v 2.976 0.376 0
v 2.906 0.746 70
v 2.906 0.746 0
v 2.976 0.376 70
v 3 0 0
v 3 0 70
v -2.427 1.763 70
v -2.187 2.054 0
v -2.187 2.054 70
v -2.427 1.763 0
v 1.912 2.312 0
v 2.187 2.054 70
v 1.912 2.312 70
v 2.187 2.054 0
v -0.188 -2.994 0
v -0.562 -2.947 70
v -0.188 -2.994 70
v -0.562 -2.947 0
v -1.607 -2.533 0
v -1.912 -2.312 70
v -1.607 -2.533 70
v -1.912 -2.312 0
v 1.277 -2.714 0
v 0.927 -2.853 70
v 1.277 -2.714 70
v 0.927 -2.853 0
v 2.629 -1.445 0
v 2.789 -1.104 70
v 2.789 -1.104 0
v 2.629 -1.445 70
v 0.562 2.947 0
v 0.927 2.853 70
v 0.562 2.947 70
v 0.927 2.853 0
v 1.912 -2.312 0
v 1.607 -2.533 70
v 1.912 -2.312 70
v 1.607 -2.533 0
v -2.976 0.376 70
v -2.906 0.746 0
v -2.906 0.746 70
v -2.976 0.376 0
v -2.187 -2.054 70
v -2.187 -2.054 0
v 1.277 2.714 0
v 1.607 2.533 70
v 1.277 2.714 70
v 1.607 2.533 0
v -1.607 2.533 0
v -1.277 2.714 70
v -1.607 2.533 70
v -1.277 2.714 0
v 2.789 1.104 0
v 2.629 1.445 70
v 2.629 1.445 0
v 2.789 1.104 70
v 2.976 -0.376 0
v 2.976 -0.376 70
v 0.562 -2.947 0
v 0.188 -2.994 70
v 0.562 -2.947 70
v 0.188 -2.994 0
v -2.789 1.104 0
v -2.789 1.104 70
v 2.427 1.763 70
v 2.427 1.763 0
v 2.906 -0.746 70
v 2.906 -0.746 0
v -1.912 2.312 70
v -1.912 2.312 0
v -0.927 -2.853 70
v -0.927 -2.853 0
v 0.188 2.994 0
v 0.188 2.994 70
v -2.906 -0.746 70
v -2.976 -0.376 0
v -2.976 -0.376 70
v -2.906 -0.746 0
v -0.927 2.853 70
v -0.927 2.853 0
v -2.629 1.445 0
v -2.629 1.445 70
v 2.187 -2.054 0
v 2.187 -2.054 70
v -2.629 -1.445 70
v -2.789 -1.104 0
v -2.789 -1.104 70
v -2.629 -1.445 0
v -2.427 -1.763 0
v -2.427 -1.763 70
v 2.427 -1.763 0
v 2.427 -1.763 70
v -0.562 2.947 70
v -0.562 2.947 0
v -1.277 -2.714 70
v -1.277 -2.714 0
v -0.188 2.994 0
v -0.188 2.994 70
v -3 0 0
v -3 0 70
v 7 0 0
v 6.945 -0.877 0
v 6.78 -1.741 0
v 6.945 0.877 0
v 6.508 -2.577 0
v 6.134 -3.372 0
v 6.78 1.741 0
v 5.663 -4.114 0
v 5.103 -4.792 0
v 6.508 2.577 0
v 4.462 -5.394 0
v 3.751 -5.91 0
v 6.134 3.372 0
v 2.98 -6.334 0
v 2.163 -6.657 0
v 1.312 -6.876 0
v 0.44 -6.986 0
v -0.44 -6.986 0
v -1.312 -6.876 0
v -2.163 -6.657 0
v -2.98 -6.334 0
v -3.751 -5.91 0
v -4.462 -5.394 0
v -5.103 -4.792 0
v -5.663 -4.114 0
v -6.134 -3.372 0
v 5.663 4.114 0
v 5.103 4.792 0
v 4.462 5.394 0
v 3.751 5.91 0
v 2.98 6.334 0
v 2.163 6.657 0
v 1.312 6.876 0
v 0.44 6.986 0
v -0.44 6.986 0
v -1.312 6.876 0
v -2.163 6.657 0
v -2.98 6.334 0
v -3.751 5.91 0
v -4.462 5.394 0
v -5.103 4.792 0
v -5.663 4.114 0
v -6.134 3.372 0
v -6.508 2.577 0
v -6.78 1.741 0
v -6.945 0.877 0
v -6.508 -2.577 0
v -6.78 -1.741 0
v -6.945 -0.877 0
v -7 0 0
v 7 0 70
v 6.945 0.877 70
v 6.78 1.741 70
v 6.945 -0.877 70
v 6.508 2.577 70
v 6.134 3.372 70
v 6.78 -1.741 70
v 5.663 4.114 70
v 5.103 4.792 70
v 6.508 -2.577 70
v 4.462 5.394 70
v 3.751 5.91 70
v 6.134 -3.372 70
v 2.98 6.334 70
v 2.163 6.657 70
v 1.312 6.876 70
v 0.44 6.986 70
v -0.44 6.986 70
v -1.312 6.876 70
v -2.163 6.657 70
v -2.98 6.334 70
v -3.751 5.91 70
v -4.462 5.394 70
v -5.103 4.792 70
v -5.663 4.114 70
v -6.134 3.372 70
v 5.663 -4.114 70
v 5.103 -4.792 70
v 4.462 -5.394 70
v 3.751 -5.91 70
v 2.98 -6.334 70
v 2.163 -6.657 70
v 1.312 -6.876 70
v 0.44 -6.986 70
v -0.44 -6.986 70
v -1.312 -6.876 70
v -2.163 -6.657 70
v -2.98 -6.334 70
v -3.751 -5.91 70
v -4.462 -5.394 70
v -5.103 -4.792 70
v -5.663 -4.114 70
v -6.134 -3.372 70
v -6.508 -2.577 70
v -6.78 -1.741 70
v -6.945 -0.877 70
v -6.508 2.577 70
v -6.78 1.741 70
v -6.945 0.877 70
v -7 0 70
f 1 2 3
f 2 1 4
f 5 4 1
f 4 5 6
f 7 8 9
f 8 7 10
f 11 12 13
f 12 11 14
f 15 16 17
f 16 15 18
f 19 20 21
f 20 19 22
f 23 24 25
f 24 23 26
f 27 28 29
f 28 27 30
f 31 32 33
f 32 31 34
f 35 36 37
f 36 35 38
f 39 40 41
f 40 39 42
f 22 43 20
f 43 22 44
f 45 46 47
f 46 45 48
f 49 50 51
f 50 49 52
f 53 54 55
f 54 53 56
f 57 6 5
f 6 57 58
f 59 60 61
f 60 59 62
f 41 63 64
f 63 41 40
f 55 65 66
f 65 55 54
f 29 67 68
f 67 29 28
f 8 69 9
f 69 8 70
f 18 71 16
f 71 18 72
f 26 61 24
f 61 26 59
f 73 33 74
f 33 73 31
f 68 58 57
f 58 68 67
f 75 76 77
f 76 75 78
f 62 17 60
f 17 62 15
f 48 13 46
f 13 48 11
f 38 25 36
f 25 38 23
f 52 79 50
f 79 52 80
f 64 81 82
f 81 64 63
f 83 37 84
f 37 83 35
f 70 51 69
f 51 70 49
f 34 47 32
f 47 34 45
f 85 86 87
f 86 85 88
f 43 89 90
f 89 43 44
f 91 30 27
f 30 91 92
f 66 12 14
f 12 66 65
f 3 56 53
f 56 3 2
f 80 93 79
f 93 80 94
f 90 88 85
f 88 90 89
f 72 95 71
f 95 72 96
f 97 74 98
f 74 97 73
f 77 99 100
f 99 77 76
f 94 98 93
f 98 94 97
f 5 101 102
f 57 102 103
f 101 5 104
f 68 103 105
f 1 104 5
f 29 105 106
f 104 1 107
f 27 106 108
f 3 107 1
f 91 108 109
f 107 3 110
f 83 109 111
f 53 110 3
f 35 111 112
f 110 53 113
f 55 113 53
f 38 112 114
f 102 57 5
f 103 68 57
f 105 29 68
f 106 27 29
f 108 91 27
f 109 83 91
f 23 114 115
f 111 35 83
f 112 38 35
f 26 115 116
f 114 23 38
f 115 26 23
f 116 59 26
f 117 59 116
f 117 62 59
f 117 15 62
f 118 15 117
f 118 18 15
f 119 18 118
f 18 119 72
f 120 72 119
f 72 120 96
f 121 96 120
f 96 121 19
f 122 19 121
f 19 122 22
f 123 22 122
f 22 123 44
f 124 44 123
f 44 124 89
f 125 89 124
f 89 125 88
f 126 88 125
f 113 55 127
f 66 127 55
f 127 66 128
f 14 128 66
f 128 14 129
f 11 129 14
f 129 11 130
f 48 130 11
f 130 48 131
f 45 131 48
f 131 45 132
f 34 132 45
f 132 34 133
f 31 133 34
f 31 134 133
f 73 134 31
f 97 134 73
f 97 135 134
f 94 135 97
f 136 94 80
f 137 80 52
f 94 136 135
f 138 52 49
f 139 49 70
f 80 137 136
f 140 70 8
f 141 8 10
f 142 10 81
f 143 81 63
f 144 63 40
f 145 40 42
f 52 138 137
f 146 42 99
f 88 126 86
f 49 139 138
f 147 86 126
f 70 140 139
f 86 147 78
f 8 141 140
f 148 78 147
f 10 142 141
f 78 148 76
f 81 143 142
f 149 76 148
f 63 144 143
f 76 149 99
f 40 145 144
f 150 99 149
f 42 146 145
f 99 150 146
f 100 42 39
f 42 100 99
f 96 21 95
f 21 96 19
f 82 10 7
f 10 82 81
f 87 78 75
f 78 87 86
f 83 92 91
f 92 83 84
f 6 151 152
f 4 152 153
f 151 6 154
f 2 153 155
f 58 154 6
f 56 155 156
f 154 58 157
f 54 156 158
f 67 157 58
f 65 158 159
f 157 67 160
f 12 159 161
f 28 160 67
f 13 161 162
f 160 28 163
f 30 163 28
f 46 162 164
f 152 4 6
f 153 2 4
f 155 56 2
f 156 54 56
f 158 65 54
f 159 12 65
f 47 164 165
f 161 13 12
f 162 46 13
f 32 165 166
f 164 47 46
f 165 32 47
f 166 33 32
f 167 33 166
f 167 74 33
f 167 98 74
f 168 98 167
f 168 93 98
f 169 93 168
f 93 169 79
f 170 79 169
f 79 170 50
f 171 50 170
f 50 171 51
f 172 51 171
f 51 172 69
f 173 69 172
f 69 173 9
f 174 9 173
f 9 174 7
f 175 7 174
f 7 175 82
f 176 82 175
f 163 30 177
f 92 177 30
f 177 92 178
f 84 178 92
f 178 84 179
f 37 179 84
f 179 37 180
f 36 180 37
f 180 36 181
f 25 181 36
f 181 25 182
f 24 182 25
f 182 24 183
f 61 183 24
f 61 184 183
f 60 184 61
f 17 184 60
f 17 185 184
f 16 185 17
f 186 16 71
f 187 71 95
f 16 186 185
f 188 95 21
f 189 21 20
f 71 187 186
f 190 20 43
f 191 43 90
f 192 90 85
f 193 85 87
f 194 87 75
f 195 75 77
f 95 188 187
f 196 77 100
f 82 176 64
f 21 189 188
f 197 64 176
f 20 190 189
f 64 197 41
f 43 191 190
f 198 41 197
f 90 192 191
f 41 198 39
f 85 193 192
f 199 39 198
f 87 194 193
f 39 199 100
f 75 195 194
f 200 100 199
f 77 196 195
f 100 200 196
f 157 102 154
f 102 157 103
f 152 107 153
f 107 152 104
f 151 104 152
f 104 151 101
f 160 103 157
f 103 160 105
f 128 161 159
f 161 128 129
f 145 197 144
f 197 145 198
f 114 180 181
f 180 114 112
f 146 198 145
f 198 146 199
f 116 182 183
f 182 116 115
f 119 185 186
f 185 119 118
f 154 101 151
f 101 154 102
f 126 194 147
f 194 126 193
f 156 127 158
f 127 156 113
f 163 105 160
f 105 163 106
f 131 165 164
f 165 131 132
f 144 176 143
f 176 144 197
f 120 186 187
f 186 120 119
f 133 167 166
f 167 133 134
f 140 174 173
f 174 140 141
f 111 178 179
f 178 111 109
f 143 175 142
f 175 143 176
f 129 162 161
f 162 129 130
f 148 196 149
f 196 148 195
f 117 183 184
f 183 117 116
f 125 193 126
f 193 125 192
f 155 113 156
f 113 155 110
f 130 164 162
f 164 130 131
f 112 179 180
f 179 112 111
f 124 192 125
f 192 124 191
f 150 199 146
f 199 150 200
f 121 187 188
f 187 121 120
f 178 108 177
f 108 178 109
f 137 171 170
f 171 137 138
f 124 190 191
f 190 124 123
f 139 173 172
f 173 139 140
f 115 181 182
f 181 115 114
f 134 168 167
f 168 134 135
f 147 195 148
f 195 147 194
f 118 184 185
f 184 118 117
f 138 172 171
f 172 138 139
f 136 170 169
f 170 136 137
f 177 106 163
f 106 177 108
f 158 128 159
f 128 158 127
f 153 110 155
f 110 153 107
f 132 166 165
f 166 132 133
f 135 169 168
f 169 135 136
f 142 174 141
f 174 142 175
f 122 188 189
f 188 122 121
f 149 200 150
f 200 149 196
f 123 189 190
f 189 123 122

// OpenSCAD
$fn = 50;

difference() {
	union() {
		cylinder(h = 70, r = 7.0);
	}
	union() {
		cylinder(h = 70, r = 3.0);
		cylinder(h = 70, r = 1.5);
	}
}
